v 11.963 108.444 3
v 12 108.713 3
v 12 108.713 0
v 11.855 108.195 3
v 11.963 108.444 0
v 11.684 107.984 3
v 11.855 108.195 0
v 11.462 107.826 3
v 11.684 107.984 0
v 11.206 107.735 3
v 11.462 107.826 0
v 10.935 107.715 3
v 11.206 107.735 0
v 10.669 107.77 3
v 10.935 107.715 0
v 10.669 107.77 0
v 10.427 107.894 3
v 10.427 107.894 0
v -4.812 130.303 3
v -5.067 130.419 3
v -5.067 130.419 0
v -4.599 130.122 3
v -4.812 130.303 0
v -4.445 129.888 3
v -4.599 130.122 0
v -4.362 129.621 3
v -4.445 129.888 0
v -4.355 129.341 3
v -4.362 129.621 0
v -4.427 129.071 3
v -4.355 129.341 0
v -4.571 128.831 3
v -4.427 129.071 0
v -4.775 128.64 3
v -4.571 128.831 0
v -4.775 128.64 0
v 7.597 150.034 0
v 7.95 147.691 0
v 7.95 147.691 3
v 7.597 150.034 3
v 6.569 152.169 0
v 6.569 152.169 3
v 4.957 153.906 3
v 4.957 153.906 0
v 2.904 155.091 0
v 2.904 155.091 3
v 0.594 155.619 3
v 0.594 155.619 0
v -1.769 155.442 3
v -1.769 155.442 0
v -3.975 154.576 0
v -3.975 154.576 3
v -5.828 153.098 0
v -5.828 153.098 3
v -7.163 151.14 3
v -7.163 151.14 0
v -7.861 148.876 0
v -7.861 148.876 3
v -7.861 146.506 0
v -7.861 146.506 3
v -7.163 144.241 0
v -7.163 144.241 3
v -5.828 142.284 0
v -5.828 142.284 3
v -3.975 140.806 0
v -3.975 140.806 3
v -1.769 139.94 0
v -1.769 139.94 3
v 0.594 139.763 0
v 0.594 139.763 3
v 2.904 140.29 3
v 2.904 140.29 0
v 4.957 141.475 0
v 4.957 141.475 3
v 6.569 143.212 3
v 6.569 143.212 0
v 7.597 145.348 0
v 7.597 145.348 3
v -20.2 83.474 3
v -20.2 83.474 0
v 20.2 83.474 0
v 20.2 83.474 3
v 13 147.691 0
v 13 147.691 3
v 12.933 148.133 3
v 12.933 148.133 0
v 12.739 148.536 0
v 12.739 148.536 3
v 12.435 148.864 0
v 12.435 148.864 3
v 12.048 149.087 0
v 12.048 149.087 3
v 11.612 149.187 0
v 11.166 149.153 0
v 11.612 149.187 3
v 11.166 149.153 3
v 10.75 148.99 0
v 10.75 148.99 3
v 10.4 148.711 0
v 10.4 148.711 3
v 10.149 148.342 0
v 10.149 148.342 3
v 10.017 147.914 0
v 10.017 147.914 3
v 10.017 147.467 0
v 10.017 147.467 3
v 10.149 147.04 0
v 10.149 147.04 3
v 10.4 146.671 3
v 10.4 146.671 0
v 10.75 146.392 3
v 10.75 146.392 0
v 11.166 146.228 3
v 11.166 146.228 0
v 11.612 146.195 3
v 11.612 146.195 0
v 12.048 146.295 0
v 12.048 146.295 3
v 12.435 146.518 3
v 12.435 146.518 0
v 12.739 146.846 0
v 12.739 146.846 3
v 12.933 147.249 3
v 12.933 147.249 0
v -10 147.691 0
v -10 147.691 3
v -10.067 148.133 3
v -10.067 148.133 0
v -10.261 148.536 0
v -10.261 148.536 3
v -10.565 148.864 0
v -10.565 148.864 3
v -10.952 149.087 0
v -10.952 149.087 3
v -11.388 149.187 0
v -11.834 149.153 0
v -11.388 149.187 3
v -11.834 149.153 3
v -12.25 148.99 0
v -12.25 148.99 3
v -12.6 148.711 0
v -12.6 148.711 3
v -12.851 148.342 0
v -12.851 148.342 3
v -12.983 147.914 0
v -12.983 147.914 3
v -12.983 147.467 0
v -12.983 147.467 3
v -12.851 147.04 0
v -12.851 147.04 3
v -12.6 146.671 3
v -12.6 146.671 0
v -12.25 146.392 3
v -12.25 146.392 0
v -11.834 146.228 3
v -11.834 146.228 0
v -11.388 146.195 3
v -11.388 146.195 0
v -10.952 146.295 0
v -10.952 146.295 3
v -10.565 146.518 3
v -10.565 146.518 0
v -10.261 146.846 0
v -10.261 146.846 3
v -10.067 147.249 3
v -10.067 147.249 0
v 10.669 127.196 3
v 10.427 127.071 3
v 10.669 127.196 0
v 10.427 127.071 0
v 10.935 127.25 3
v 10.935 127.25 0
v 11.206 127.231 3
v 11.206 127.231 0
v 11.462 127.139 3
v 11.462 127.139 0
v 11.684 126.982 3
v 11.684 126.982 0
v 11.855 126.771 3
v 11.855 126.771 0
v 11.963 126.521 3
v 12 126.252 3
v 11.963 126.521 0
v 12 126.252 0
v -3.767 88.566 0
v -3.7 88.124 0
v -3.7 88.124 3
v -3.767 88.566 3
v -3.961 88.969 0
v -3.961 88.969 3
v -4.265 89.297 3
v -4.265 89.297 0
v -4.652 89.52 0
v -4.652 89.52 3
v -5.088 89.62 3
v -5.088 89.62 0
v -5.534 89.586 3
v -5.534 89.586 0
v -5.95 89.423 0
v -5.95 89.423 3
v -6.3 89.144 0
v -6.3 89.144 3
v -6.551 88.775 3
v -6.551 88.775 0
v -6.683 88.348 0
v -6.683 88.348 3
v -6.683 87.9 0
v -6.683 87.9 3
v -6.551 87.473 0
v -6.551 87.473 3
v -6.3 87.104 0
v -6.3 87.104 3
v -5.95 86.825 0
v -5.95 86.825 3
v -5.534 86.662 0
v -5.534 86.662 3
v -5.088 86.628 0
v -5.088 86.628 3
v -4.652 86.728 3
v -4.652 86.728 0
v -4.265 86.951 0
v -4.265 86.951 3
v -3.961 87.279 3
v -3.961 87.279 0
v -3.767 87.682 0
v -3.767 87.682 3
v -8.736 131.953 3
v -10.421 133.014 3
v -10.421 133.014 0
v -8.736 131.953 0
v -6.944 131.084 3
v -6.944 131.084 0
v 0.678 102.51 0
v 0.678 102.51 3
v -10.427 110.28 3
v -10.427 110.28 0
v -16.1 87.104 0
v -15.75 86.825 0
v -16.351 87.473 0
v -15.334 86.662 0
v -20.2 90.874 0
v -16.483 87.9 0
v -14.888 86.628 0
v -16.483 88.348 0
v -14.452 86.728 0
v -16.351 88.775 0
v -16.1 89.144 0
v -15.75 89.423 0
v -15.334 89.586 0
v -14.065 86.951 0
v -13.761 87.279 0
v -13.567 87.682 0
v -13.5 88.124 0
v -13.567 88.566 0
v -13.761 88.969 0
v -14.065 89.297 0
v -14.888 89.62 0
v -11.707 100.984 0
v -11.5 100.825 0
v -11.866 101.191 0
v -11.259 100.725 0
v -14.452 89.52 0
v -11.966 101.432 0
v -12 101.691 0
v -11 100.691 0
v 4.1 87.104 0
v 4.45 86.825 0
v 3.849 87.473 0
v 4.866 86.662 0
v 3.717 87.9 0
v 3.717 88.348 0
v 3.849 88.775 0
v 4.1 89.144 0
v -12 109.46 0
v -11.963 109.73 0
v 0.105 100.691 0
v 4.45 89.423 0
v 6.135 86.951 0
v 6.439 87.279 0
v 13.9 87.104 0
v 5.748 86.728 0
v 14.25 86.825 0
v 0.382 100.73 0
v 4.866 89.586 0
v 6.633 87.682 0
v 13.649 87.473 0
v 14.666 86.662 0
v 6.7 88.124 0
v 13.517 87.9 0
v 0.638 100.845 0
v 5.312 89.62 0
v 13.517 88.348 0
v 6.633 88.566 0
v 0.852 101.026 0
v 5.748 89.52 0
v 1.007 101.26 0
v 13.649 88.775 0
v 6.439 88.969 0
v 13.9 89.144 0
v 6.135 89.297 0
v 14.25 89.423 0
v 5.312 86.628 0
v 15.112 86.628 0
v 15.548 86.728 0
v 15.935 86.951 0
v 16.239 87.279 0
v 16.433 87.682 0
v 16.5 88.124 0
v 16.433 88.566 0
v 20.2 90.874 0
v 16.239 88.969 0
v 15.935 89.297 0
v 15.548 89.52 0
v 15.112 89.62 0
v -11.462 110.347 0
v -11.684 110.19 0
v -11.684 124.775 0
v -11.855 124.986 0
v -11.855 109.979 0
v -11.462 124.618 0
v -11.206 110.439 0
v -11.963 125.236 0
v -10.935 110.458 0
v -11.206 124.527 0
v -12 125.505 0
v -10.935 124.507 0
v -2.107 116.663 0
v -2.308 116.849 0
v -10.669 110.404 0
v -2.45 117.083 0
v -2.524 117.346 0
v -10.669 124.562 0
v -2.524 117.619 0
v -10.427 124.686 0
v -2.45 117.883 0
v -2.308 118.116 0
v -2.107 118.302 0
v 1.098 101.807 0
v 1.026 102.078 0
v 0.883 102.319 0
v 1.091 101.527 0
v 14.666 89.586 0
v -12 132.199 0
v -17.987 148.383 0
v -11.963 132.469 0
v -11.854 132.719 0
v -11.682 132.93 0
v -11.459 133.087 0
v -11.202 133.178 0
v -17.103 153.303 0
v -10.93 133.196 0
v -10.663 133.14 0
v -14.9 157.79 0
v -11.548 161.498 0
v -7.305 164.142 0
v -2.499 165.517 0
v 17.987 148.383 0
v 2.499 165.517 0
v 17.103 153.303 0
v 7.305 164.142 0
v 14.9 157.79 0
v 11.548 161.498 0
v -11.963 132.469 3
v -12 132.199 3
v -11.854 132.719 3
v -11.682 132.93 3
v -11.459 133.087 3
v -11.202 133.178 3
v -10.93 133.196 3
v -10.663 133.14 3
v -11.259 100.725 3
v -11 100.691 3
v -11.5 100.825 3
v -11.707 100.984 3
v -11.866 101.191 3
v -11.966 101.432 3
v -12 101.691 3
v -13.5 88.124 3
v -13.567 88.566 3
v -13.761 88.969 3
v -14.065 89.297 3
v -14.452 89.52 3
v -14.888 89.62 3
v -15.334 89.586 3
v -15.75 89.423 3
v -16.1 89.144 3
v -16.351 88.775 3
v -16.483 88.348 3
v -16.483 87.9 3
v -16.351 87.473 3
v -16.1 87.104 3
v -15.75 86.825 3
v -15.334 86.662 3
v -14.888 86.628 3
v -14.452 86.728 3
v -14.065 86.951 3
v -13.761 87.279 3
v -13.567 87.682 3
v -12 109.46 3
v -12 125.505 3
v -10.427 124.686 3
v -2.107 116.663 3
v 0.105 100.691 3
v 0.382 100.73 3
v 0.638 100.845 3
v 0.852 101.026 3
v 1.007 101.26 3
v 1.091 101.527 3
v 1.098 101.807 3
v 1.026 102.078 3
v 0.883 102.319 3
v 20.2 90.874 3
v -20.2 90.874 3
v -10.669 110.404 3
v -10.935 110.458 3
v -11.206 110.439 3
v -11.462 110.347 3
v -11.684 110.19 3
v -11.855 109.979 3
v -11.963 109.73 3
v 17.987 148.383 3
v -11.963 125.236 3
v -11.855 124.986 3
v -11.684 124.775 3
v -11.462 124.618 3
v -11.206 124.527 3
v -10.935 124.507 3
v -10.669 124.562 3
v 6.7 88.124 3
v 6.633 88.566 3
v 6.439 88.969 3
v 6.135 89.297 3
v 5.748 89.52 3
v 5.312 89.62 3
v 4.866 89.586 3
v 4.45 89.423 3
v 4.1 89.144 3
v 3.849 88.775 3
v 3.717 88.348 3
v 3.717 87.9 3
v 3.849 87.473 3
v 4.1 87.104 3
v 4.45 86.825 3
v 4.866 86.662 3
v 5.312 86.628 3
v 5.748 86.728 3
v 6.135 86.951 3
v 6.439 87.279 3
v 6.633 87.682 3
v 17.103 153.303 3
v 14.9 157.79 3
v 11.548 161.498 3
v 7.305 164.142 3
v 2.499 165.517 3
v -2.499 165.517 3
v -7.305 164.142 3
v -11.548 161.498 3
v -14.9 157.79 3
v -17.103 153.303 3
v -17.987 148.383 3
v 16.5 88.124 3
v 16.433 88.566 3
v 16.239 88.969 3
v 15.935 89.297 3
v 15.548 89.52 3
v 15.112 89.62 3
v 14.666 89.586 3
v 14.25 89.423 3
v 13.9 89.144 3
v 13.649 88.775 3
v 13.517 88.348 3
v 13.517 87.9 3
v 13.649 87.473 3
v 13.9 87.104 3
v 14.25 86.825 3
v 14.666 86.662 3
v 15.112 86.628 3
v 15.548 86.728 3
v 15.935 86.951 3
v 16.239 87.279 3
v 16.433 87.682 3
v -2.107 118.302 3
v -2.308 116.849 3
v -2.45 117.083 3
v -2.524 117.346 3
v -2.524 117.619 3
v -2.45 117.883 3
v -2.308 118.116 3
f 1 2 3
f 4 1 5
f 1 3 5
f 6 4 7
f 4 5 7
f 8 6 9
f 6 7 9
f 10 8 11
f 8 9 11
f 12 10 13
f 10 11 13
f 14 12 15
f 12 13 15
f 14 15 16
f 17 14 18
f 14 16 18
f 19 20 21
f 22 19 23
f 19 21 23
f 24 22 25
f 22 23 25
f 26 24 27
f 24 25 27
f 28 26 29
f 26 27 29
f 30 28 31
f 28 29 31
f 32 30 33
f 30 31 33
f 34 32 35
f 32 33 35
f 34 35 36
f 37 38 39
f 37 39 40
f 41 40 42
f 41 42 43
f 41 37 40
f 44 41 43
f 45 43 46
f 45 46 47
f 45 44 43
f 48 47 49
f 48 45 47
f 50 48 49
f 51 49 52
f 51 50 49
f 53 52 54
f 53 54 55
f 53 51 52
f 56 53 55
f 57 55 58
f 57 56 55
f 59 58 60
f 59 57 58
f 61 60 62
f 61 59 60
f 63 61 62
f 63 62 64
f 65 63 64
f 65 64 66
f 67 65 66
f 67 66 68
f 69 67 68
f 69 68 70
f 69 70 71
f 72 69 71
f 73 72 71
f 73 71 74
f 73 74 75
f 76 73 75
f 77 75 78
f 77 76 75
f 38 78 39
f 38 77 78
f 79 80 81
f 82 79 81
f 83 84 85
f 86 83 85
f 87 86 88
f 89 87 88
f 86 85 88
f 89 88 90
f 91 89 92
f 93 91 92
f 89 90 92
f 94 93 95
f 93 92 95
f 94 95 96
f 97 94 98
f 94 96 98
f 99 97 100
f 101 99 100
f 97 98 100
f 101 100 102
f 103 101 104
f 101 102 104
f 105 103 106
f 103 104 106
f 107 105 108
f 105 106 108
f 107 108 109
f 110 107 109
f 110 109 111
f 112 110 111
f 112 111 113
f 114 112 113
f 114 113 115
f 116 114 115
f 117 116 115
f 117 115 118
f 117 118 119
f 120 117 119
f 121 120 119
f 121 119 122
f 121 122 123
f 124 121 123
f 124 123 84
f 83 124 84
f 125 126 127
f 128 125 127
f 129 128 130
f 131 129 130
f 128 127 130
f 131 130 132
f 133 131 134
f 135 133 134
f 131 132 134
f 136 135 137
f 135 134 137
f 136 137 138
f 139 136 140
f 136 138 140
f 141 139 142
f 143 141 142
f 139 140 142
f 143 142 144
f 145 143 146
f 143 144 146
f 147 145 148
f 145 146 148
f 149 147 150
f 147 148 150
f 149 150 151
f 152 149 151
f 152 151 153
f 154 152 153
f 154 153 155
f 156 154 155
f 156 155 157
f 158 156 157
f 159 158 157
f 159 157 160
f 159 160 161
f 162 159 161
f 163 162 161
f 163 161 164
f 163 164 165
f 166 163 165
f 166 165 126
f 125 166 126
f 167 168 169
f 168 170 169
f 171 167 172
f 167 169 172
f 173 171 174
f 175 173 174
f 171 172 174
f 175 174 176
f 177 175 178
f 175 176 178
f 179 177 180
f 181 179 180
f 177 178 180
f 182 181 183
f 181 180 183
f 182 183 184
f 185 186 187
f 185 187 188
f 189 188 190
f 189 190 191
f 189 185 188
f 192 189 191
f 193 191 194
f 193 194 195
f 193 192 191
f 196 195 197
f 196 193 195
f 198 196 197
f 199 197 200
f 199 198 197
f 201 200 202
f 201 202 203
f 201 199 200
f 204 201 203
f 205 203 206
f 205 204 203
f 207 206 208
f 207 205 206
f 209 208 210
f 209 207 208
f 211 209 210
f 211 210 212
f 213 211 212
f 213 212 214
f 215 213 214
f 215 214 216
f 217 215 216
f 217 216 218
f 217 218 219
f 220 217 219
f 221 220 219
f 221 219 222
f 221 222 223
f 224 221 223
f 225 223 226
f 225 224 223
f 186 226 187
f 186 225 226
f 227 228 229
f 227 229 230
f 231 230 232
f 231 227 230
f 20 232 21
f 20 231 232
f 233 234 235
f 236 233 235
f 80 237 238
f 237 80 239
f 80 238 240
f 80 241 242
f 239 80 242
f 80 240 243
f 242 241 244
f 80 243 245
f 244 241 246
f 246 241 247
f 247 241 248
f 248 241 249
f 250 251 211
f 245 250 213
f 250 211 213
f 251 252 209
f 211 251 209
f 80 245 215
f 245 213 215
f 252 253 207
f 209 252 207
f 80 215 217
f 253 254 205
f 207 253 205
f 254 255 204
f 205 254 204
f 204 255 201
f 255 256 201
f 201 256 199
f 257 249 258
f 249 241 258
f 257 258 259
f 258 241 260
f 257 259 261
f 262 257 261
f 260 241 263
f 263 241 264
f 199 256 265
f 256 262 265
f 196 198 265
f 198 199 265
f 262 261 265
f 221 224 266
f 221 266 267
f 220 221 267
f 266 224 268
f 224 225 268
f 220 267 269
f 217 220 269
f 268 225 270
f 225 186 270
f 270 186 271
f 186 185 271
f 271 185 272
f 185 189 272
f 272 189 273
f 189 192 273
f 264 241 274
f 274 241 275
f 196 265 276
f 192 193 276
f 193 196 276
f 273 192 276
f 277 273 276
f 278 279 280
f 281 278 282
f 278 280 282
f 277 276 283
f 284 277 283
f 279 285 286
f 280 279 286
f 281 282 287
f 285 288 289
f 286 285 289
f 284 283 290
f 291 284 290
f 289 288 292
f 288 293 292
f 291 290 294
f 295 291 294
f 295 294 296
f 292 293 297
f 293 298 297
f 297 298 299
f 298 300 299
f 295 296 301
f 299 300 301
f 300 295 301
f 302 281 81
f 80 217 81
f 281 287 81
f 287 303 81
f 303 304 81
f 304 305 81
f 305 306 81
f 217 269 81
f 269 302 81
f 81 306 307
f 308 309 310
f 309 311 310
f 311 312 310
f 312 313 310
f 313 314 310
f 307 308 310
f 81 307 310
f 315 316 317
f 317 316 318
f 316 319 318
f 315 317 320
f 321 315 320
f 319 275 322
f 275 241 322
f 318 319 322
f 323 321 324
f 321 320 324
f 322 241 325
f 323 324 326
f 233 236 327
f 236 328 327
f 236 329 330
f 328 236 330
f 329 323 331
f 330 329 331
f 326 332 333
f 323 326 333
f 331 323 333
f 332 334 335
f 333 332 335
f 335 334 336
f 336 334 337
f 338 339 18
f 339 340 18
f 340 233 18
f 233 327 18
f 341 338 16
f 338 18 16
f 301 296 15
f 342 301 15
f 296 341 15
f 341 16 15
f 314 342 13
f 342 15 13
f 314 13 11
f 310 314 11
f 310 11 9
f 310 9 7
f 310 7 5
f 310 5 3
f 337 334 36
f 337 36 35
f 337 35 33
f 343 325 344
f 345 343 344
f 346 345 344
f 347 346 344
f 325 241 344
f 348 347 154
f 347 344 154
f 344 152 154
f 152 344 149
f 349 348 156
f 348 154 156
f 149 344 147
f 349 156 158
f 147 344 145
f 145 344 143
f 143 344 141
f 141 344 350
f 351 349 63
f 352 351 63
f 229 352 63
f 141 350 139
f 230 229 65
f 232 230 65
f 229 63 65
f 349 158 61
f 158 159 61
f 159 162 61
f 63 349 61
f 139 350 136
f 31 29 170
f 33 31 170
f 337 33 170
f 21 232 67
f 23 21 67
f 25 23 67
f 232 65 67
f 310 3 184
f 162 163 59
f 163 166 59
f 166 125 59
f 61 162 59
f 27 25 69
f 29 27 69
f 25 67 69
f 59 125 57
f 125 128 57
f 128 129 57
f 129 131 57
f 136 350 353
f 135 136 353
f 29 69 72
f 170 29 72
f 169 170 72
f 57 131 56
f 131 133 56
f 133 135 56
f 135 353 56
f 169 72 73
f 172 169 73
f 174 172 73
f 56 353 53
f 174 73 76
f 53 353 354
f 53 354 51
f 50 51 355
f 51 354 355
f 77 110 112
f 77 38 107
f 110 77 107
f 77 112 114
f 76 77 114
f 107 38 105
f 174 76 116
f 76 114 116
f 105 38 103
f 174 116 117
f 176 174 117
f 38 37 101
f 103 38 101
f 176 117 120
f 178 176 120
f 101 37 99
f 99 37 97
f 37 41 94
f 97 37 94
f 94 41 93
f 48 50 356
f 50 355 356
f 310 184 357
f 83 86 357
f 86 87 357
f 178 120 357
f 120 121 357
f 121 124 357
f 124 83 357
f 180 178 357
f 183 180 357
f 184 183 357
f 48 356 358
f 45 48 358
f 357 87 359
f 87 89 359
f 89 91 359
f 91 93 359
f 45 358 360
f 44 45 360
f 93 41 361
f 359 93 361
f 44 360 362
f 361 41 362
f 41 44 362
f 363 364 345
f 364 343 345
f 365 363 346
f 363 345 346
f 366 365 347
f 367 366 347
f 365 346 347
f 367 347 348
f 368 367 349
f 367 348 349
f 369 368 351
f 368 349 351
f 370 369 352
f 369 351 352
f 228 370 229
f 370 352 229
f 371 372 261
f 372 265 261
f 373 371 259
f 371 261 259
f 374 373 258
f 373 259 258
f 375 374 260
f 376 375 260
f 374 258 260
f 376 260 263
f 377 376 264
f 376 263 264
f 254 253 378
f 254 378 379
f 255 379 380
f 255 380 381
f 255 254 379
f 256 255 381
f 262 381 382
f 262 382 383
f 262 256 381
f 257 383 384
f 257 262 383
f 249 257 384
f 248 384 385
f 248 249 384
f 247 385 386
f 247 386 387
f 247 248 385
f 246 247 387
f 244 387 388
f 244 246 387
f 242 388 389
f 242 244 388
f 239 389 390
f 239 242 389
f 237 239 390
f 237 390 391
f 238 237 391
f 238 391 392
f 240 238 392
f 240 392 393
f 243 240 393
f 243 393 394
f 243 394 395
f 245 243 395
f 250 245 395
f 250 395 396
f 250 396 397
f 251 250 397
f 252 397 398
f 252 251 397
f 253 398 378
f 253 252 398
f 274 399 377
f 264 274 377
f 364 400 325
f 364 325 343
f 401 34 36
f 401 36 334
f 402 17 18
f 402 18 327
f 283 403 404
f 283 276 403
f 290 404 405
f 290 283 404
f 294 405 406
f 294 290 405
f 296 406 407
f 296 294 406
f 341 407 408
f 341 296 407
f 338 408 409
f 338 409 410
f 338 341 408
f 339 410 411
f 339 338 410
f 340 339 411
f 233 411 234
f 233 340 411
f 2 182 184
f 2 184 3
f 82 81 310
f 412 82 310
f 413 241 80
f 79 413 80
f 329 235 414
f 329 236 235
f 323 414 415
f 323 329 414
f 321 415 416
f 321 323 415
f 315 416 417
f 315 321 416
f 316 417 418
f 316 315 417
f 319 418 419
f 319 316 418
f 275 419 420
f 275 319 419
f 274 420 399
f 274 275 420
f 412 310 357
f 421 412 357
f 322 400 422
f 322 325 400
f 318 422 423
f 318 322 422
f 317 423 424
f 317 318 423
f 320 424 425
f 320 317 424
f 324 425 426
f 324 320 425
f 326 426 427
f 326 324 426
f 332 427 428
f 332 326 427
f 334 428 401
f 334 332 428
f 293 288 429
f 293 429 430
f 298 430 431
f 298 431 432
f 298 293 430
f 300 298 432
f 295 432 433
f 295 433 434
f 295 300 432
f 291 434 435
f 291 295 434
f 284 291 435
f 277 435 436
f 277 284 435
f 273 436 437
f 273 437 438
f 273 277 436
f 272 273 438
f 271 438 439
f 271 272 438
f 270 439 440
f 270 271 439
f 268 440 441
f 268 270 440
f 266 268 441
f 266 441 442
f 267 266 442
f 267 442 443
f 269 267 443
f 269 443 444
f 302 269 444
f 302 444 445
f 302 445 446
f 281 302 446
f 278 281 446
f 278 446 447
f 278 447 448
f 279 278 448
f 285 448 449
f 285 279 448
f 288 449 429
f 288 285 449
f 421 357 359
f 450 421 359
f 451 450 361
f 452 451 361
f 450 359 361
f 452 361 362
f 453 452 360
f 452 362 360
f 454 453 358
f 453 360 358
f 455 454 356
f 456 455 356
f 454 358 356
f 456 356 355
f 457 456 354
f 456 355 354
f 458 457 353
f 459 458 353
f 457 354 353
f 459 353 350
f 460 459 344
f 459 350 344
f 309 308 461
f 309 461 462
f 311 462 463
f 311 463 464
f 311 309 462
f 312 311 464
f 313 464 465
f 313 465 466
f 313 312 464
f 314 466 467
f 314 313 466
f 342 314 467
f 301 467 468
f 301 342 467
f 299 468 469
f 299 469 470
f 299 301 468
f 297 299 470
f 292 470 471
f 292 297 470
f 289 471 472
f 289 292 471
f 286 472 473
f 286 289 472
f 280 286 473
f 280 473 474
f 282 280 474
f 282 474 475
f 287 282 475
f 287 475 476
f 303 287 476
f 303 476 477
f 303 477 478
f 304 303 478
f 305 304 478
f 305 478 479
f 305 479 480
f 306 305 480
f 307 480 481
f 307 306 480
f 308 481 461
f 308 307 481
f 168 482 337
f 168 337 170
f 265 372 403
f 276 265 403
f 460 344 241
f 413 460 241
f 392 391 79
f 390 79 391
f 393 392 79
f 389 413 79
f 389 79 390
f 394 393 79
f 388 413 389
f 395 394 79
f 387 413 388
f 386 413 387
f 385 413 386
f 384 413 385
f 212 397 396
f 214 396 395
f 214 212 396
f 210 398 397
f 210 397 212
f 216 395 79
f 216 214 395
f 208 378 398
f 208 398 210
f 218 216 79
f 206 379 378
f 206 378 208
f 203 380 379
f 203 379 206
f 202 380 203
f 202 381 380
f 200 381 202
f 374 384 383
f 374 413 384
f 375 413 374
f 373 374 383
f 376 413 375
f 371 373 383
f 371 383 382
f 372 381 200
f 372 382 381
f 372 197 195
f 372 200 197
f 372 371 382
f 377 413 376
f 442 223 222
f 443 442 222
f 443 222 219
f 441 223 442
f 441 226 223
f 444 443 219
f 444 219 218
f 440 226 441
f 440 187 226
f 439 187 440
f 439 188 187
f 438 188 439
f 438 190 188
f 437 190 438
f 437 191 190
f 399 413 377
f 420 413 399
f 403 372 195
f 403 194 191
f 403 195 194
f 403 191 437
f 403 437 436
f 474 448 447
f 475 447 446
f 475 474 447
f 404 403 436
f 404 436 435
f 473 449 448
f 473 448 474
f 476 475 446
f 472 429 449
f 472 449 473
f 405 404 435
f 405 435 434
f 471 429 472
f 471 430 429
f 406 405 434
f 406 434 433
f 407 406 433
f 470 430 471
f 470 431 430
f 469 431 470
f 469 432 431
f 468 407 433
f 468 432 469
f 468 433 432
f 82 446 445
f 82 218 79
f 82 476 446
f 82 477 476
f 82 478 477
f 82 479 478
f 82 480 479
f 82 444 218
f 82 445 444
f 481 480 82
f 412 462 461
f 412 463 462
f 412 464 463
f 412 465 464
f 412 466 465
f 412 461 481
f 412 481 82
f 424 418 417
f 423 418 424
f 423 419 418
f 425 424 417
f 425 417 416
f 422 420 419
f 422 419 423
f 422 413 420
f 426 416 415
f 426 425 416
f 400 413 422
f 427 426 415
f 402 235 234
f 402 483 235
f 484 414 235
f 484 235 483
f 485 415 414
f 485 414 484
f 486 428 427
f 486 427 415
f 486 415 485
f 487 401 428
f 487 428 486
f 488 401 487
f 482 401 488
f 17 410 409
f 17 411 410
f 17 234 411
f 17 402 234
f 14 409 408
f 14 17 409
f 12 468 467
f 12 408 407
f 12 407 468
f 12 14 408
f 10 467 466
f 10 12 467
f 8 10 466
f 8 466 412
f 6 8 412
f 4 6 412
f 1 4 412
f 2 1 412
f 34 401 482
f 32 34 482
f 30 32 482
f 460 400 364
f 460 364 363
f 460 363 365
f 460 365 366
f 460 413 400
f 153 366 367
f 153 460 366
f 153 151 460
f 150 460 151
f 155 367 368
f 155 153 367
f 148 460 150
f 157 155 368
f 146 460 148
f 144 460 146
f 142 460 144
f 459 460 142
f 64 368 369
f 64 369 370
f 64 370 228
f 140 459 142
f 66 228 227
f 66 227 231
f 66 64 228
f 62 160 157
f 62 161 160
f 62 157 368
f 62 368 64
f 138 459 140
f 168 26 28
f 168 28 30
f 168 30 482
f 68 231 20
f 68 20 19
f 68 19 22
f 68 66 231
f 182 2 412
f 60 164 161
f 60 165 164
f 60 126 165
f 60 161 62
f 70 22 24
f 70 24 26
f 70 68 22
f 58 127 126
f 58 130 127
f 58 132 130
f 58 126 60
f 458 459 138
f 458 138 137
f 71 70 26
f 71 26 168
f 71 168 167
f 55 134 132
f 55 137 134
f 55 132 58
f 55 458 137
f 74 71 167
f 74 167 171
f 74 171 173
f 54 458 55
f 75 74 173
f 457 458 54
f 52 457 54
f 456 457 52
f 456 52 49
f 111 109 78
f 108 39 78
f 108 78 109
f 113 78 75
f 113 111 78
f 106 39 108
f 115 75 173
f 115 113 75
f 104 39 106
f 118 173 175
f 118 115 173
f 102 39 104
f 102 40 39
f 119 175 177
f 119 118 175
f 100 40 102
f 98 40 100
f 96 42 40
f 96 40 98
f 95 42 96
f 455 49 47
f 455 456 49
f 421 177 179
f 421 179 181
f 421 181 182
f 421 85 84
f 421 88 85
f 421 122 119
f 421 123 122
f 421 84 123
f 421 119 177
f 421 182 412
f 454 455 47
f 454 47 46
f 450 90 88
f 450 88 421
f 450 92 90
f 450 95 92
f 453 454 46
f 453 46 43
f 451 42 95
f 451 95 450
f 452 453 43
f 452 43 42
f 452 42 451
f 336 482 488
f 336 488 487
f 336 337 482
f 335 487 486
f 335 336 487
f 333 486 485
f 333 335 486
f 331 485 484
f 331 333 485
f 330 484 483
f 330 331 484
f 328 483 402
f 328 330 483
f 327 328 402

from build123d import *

# Parameters (mm, degrees)
SKETCH1_R               = 1.5
SKETCH1_R_2             = 7.95
MAIN_BODY_LINK_B1_DEPTH = 3
CUT_EXTRUDE1_REACH      = 168.945
CUT_EXTRUDE2_REACH      = 168.945
SKETCH3_R               = 1.5
FILLET1_R               = 1


with BuildPart() as part:
    # Sketch1 → Main Body Link B1 (new body)
    with BuildSketch(Plane.XY):
        with BuildLine():
            Line((-11.1, 83.474052381), (-9.1, 83.474052381))
            Line((-9.1, 83.474052381), (0, 83.474052381))
            Line((0, 83.474052381), (9.1, 83.474052381))
            Line((9.1, 83.474052381), (11.1, 83.474052381))
            Line((11.1, 83.474052381), (20.2, 83.474052381))
            Line((20.2, 83.474052381), (20.2, 90.874052381))
            Line((20.2, 90.874052381), (17.986683974, 148.383116621))
            ThreePointArc((17.986683974, 148.383116621), (0, 165.690874165), (-17.986683974, 148.383116621))
            Line((-17.986683974, 148.383116621), (-20.2, 90.874052381))
            Line((-20.2, 90.874052381), (-20.2, 83.474052381))
            Line((-20.2, 83.474052381), (-11.1, 83.474052381))
        make_face()
        with Locations((5.2, 88.124052381)):
            Circle(SKETCH1_R, mode=Mode.SUBTRACT)
        with Locations((15, 88.124052381)):
            Circle(SKETCH1_R, mode=Mode.SUBTRACT)
        with Locations((-15, 88.124052381)):
            Circle(SKETCH1_R, mode=Mode.SUBTRACT)
        with Locations((-5.2, 88.124052381)):
            Circle(SKETCH1_R, mode=Mode.SUBTRACT)
        with Locations((0, 147.690874165)):
            Circle(SKETCH1_R_2, mode=Mode.SUBTRACT)
    extrude(amount=MAIN_BODY_LINK_B1_DEPTH)

    # Sketch2 → Cut-Extrude1 (cut, up to next)
    with BuildSketch(Plane.XY.offset(3), mode=Mode.PRIVATE) as cut_extrude1_sk1:
        with BuildLine():
            ThreePointArc((-2.929911079, 129.930929878), (-7.774454217, 131.456408925), (-12, 134.2744663))
            Line((-12, 134.2744663), (-12, 123.584968066))
            Line((-12, 123.584968066), (-2.929911079, 129.930929878))
        make_face()
    cut_extrude1_tool1 = extrude(cut_extrude1_sk1.sketch, amount=-CUT_EXTRUDE1_REACH, mode=Mode.PRIVATE) & part.part
    # Sketch2 → Cut-Extrude1 (cut, up to next)
    with BuildSketch(Plane.XY.offset(3), mode=Mode.PRIVATE) as cut_extrude1_sk2:
        Polygon((-12, 111.380372399), (-12, 100.690874165), (3.278172542, 100.690874165), align=None)
    cut_extrude1_tool2 = extrude(cut_extrude1_sk2.sketch, amount=-CUT_EXTRUDE1_REACH, mode=Mode.PRIVATE) & part.part
    # Sketch2 → Cut-Extrude1 (cut, up to next)
    with BuildSketch(Plane.XY.offset(3), mode=Mode.PRIVATE) as cut_extrude1_sk3:
        Polygon((12, 106.793171999), (12, 128.172168466), (-3.278172542, 117.482670232), align=None)
    cut_extrude1_tool3 = extrude(cut_extrude1_sk3.sketch, amount=-CUT_EXTRUDE1_REACH, mode=Mode.PRIVATE) & part.part
    add(cut_extrude1_tool1.solids().sort_by_distance((-9.12997, 128.978342, 3))[0], mode=Mode.SUBTRACT)
    add(cut_extrude1_tool2.solids().sort_by_distance((-6.907276, 104.25404, 3))[0], mode=Mode.SUBTRACT)
    add(cut_extrude1_tool3.solids().sort_by_distance((6.907276, 117.48267, 3))[0], mode=Mode.SUBTRACT)

    # Sketch3 → Cut-Extrude2 (cut, up to next)
    with BuildSketch(Plane.XY.offset(3), mode=Mode.PRIVATE) as cut_extrude2_sk1:
        with Locations((-11.5, 147.690874165)):
            Circle(SKETCH3_R)
    cut_extrude2_tool1 = extrude(cut_extrude2_sk1.sketch, amount=-CUT_EXTRUDE2_REACH, mode=Mode.PRIVATE) & part.part
    # Sketch3 → Cut-Extrude2 (cut, up to next)
    with BuildSketch(Plane.XY.offset(3), mode=Mode.PRIVATE) as cut_extrude2_sk2:
        with Locations((11.5, 147.690874165)):
            Circle(SKETCH3_R)
    cut_extrude2_tool2 = extrude(cut_extrude2_sk2.sketch, amount=-CUT_EXTRUDE2_REACH, mode=Mode.PRIVATE) & part.part
    add(cut_extrude2_tool1.solids().sort_by_distance((-11.5, 147.690874, 3))[0], mode=Mode.SUBTRACT)
    add(cut_extrude2_tool2.solids().sort_by_distance((11.5, 147.690874, 3))[0], mode=Mode.SUBTRACT)

    # Fillet1
    fillet1_edges = [part.edges().sort_by_distance(p)[0] for p in [
        (-12, 100.690874165, 1.5),
        (3.278172542, 100.690874165, 1.5),
        (-12, 111.380372399, 1.5),
        (12, 106.793171999, 1.5),
        (12, 128.172168466, 1.5),
        (-3.278172542, 117.482670232, 1.5),
        (-12, 123.584968066, 1.5),
        (-2.929911079, 129.930929878, 1.5),
        (-12, 134.2744663, 1.5),
    ]]
    fillet(fillet1_edges, radius=FILLET1_R)


solid = part.part
